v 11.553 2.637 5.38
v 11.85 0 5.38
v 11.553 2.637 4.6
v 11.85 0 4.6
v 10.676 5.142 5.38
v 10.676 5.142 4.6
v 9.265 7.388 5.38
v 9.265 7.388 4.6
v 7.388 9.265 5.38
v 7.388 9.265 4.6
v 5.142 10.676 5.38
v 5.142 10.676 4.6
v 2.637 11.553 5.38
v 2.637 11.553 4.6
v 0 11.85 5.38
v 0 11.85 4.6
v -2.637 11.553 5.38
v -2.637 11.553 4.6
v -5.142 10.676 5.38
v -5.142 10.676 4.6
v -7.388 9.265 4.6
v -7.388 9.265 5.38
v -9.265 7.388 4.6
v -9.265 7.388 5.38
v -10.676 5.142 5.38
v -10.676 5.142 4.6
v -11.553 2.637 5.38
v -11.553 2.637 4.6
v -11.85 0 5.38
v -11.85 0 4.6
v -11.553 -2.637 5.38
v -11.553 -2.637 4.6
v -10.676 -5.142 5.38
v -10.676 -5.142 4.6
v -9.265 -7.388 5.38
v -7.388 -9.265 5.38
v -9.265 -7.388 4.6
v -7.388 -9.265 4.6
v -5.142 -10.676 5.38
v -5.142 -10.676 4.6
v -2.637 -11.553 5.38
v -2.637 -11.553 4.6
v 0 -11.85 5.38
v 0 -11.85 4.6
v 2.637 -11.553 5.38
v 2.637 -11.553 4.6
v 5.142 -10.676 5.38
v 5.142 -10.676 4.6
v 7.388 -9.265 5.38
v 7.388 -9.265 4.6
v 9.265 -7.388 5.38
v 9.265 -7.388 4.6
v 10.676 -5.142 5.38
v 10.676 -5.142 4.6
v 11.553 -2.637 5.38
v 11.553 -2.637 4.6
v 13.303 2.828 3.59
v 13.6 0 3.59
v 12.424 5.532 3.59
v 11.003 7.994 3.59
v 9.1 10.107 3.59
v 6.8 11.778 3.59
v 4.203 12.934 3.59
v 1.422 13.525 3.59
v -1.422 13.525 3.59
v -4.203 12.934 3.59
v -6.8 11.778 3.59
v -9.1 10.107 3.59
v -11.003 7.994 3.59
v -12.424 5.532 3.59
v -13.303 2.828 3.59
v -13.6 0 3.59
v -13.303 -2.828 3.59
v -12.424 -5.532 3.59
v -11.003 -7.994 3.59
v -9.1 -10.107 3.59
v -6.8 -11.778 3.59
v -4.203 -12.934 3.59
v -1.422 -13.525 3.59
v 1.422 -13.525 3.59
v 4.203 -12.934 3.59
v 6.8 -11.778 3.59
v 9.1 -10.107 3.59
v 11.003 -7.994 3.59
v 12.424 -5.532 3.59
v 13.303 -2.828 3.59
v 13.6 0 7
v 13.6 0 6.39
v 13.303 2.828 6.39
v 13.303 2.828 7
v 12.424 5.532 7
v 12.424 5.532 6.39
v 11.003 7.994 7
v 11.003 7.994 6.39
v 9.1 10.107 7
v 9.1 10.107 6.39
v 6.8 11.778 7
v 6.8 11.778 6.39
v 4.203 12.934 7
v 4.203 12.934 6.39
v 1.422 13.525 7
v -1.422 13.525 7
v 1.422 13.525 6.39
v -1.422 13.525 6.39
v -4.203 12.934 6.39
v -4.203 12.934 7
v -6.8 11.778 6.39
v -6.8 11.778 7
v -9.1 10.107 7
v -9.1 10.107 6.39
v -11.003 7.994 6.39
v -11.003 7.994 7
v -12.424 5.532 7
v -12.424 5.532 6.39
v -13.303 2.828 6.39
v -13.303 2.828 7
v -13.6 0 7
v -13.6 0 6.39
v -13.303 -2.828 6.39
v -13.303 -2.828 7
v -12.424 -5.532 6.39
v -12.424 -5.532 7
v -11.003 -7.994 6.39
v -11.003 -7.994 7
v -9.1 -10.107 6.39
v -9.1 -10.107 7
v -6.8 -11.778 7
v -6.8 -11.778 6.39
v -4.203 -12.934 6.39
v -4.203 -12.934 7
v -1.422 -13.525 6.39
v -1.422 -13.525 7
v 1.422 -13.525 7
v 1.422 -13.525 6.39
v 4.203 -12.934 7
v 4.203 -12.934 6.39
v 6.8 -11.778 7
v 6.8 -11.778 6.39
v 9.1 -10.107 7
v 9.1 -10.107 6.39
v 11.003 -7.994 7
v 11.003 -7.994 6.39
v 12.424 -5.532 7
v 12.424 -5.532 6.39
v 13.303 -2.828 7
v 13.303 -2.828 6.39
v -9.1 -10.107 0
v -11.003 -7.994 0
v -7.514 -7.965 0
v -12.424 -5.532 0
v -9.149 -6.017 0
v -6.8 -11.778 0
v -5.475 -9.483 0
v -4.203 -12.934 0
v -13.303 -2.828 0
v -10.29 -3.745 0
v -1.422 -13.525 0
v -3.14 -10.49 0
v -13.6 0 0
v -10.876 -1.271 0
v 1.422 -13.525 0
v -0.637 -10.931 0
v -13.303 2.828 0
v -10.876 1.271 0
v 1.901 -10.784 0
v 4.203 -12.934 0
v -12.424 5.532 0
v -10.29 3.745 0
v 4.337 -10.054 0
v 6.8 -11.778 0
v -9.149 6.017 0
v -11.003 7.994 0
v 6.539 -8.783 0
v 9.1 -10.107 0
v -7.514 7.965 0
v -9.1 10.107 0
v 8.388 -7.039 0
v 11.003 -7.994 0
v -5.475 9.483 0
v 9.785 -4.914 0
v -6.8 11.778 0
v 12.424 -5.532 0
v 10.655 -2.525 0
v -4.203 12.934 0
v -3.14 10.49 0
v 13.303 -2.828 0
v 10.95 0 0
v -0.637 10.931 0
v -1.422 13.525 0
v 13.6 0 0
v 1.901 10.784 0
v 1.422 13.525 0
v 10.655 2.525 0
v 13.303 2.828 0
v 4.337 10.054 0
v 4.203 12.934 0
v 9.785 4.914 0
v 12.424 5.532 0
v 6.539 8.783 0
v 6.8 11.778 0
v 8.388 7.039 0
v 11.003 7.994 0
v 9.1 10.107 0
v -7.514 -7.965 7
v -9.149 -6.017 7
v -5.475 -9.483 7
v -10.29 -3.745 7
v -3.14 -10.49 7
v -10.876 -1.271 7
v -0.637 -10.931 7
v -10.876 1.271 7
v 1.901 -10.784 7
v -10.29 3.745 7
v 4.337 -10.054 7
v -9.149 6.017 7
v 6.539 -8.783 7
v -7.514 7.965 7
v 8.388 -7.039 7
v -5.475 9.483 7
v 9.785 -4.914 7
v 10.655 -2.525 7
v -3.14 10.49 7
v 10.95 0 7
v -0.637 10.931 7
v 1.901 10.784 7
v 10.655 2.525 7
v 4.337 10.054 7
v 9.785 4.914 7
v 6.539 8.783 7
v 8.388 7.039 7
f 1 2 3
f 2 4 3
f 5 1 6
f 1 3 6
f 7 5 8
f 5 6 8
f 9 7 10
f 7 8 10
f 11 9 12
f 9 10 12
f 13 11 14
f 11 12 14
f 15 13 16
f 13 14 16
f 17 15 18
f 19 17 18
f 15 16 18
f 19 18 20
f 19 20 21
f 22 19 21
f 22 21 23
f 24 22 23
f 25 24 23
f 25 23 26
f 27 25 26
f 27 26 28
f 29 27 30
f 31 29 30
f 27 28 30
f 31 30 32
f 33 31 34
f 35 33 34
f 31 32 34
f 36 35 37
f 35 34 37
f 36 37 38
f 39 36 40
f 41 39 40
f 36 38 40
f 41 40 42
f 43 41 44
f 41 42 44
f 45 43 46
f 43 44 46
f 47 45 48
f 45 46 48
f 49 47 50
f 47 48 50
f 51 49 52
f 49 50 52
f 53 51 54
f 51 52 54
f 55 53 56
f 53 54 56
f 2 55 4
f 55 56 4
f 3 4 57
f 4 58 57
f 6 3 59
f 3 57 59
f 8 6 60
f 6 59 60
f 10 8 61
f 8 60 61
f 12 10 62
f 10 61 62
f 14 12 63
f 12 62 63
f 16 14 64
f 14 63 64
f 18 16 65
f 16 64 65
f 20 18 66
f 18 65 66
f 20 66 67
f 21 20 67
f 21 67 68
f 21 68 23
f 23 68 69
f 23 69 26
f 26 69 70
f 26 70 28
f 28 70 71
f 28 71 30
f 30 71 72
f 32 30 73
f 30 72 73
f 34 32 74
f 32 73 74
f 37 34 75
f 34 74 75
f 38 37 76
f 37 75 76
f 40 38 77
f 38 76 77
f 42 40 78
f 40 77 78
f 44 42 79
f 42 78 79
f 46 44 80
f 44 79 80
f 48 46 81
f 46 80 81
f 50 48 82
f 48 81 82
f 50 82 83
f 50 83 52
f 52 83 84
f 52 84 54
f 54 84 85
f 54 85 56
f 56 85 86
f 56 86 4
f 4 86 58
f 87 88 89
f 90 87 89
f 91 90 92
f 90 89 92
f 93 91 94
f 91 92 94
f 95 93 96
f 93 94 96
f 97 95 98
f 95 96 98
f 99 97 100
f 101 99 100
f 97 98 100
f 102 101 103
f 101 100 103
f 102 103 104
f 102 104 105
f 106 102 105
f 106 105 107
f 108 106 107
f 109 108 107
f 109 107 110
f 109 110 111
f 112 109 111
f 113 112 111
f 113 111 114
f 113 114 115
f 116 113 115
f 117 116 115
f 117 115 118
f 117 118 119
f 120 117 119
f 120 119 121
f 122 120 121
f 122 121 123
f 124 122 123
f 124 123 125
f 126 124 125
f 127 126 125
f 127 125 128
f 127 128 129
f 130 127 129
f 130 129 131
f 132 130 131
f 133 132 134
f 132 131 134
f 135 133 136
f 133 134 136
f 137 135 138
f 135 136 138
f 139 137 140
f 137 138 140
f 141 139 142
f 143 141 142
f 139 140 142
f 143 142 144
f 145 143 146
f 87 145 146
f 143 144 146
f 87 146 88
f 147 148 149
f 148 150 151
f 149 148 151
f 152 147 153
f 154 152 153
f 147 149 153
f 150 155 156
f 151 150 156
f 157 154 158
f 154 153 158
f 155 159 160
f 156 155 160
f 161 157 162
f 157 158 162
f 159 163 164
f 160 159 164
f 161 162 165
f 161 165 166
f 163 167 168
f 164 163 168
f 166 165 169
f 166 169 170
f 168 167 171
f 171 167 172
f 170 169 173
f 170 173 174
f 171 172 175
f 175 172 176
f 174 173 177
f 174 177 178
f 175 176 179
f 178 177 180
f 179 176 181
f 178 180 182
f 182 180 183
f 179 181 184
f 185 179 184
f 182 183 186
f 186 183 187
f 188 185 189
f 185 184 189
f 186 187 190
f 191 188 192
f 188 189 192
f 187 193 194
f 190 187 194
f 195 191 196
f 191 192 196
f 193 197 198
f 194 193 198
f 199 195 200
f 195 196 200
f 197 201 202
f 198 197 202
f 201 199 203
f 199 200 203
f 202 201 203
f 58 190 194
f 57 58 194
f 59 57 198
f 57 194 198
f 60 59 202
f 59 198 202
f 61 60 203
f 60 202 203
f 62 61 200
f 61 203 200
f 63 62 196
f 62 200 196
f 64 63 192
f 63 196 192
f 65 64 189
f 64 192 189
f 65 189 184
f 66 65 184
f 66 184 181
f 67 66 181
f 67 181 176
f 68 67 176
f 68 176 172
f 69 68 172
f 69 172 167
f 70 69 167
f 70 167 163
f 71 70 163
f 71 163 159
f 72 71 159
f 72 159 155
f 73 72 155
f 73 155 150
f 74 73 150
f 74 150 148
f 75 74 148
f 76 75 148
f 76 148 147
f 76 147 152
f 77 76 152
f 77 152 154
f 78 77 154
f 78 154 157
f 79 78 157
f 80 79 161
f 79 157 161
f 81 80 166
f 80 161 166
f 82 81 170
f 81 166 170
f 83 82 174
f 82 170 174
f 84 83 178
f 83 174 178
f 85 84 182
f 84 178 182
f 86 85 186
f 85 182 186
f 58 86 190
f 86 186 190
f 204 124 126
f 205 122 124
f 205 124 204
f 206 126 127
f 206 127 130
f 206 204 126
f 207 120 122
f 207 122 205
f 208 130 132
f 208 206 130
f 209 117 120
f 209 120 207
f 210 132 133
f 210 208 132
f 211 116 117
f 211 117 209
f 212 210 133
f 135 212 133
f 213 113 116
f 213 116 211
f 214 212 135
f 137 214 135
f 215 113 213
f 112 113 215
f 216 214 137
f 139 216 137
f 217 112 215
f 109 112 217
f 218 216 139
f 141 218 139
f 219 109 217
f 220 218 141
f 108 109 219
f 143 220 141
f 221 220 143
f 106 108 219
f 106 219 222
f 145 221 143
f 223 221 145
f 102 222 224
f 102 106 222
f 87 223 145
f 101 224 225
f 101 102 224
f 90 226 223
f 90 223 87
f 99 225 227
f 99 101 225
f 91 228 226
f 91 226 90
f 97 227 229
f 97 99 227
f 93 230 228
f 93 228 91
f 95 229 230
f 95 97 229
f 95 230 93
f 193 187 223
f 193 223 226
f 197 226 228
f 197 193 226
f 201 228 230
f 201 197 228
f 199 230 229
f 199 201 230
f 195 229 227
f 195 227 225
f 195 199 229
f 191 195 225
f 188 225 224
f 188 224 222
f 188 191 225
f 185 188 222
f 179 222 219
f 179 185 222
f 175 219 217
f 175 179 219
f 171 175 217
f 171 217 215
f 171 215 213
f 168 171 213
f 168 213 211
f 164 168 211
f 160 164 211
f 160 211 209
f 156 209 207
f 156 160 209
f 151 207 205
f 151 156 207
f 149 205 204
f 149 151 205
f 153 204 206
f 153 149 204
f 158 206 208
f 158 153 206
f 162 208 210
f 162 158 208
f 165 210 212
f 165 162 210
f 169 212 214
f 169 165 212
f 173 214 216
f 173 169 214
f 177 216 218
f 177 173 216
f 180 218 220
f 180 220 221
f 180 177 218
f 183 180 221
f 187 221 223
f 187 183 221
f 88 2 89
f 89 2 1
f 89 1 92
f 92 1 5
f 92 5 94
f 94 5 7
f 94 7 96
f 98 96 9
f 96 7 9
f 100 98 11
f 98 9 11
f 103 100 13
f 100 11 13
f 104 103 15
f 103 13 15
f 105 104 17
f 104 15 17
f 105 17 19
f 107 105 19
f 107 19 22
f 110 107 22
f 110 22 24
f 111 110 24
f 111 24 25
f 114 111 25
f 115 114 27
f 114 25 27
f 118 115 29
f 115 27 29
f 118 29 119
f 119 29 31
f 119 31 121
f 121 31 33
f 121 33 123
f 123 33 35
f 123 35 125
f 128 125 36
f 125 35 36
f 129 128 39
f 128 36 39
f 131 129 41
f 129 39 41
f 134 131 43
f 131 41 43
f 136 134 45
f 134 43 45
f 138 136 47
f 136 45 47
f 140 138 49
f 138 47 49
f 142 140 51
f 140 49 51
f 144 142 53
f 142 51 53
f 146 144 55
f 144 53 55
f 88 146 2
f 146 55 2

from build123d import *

# Parameters (mm, degrees)
F0_R     = 13.6
F0_R_2   = 10.95
F1_DEPTH = 7


with BuildPart() as f1:
    # F0 (on Top) → F1 (new body)
    with BuildSketch(Plane.XY):
        Circle(F0_R)
        Circle(F0_R_2, mode=Mode.SUBTRACT)
    extrude(amount=F1_DEPTH)

    # F2 (on Front) → F3 (revolve, cut)
    with BuildSketch(Plane.XZ):
        Polygon((13.6, 3.59), (13.6, 6.39), (11.85, 5.379637), (11.85, 4.600363), align=None)
    revolve(axis=Axis((0, 0, 7), (0, 0, 1)), mode=Mode.SUBTRACT)


solid = f1.part
